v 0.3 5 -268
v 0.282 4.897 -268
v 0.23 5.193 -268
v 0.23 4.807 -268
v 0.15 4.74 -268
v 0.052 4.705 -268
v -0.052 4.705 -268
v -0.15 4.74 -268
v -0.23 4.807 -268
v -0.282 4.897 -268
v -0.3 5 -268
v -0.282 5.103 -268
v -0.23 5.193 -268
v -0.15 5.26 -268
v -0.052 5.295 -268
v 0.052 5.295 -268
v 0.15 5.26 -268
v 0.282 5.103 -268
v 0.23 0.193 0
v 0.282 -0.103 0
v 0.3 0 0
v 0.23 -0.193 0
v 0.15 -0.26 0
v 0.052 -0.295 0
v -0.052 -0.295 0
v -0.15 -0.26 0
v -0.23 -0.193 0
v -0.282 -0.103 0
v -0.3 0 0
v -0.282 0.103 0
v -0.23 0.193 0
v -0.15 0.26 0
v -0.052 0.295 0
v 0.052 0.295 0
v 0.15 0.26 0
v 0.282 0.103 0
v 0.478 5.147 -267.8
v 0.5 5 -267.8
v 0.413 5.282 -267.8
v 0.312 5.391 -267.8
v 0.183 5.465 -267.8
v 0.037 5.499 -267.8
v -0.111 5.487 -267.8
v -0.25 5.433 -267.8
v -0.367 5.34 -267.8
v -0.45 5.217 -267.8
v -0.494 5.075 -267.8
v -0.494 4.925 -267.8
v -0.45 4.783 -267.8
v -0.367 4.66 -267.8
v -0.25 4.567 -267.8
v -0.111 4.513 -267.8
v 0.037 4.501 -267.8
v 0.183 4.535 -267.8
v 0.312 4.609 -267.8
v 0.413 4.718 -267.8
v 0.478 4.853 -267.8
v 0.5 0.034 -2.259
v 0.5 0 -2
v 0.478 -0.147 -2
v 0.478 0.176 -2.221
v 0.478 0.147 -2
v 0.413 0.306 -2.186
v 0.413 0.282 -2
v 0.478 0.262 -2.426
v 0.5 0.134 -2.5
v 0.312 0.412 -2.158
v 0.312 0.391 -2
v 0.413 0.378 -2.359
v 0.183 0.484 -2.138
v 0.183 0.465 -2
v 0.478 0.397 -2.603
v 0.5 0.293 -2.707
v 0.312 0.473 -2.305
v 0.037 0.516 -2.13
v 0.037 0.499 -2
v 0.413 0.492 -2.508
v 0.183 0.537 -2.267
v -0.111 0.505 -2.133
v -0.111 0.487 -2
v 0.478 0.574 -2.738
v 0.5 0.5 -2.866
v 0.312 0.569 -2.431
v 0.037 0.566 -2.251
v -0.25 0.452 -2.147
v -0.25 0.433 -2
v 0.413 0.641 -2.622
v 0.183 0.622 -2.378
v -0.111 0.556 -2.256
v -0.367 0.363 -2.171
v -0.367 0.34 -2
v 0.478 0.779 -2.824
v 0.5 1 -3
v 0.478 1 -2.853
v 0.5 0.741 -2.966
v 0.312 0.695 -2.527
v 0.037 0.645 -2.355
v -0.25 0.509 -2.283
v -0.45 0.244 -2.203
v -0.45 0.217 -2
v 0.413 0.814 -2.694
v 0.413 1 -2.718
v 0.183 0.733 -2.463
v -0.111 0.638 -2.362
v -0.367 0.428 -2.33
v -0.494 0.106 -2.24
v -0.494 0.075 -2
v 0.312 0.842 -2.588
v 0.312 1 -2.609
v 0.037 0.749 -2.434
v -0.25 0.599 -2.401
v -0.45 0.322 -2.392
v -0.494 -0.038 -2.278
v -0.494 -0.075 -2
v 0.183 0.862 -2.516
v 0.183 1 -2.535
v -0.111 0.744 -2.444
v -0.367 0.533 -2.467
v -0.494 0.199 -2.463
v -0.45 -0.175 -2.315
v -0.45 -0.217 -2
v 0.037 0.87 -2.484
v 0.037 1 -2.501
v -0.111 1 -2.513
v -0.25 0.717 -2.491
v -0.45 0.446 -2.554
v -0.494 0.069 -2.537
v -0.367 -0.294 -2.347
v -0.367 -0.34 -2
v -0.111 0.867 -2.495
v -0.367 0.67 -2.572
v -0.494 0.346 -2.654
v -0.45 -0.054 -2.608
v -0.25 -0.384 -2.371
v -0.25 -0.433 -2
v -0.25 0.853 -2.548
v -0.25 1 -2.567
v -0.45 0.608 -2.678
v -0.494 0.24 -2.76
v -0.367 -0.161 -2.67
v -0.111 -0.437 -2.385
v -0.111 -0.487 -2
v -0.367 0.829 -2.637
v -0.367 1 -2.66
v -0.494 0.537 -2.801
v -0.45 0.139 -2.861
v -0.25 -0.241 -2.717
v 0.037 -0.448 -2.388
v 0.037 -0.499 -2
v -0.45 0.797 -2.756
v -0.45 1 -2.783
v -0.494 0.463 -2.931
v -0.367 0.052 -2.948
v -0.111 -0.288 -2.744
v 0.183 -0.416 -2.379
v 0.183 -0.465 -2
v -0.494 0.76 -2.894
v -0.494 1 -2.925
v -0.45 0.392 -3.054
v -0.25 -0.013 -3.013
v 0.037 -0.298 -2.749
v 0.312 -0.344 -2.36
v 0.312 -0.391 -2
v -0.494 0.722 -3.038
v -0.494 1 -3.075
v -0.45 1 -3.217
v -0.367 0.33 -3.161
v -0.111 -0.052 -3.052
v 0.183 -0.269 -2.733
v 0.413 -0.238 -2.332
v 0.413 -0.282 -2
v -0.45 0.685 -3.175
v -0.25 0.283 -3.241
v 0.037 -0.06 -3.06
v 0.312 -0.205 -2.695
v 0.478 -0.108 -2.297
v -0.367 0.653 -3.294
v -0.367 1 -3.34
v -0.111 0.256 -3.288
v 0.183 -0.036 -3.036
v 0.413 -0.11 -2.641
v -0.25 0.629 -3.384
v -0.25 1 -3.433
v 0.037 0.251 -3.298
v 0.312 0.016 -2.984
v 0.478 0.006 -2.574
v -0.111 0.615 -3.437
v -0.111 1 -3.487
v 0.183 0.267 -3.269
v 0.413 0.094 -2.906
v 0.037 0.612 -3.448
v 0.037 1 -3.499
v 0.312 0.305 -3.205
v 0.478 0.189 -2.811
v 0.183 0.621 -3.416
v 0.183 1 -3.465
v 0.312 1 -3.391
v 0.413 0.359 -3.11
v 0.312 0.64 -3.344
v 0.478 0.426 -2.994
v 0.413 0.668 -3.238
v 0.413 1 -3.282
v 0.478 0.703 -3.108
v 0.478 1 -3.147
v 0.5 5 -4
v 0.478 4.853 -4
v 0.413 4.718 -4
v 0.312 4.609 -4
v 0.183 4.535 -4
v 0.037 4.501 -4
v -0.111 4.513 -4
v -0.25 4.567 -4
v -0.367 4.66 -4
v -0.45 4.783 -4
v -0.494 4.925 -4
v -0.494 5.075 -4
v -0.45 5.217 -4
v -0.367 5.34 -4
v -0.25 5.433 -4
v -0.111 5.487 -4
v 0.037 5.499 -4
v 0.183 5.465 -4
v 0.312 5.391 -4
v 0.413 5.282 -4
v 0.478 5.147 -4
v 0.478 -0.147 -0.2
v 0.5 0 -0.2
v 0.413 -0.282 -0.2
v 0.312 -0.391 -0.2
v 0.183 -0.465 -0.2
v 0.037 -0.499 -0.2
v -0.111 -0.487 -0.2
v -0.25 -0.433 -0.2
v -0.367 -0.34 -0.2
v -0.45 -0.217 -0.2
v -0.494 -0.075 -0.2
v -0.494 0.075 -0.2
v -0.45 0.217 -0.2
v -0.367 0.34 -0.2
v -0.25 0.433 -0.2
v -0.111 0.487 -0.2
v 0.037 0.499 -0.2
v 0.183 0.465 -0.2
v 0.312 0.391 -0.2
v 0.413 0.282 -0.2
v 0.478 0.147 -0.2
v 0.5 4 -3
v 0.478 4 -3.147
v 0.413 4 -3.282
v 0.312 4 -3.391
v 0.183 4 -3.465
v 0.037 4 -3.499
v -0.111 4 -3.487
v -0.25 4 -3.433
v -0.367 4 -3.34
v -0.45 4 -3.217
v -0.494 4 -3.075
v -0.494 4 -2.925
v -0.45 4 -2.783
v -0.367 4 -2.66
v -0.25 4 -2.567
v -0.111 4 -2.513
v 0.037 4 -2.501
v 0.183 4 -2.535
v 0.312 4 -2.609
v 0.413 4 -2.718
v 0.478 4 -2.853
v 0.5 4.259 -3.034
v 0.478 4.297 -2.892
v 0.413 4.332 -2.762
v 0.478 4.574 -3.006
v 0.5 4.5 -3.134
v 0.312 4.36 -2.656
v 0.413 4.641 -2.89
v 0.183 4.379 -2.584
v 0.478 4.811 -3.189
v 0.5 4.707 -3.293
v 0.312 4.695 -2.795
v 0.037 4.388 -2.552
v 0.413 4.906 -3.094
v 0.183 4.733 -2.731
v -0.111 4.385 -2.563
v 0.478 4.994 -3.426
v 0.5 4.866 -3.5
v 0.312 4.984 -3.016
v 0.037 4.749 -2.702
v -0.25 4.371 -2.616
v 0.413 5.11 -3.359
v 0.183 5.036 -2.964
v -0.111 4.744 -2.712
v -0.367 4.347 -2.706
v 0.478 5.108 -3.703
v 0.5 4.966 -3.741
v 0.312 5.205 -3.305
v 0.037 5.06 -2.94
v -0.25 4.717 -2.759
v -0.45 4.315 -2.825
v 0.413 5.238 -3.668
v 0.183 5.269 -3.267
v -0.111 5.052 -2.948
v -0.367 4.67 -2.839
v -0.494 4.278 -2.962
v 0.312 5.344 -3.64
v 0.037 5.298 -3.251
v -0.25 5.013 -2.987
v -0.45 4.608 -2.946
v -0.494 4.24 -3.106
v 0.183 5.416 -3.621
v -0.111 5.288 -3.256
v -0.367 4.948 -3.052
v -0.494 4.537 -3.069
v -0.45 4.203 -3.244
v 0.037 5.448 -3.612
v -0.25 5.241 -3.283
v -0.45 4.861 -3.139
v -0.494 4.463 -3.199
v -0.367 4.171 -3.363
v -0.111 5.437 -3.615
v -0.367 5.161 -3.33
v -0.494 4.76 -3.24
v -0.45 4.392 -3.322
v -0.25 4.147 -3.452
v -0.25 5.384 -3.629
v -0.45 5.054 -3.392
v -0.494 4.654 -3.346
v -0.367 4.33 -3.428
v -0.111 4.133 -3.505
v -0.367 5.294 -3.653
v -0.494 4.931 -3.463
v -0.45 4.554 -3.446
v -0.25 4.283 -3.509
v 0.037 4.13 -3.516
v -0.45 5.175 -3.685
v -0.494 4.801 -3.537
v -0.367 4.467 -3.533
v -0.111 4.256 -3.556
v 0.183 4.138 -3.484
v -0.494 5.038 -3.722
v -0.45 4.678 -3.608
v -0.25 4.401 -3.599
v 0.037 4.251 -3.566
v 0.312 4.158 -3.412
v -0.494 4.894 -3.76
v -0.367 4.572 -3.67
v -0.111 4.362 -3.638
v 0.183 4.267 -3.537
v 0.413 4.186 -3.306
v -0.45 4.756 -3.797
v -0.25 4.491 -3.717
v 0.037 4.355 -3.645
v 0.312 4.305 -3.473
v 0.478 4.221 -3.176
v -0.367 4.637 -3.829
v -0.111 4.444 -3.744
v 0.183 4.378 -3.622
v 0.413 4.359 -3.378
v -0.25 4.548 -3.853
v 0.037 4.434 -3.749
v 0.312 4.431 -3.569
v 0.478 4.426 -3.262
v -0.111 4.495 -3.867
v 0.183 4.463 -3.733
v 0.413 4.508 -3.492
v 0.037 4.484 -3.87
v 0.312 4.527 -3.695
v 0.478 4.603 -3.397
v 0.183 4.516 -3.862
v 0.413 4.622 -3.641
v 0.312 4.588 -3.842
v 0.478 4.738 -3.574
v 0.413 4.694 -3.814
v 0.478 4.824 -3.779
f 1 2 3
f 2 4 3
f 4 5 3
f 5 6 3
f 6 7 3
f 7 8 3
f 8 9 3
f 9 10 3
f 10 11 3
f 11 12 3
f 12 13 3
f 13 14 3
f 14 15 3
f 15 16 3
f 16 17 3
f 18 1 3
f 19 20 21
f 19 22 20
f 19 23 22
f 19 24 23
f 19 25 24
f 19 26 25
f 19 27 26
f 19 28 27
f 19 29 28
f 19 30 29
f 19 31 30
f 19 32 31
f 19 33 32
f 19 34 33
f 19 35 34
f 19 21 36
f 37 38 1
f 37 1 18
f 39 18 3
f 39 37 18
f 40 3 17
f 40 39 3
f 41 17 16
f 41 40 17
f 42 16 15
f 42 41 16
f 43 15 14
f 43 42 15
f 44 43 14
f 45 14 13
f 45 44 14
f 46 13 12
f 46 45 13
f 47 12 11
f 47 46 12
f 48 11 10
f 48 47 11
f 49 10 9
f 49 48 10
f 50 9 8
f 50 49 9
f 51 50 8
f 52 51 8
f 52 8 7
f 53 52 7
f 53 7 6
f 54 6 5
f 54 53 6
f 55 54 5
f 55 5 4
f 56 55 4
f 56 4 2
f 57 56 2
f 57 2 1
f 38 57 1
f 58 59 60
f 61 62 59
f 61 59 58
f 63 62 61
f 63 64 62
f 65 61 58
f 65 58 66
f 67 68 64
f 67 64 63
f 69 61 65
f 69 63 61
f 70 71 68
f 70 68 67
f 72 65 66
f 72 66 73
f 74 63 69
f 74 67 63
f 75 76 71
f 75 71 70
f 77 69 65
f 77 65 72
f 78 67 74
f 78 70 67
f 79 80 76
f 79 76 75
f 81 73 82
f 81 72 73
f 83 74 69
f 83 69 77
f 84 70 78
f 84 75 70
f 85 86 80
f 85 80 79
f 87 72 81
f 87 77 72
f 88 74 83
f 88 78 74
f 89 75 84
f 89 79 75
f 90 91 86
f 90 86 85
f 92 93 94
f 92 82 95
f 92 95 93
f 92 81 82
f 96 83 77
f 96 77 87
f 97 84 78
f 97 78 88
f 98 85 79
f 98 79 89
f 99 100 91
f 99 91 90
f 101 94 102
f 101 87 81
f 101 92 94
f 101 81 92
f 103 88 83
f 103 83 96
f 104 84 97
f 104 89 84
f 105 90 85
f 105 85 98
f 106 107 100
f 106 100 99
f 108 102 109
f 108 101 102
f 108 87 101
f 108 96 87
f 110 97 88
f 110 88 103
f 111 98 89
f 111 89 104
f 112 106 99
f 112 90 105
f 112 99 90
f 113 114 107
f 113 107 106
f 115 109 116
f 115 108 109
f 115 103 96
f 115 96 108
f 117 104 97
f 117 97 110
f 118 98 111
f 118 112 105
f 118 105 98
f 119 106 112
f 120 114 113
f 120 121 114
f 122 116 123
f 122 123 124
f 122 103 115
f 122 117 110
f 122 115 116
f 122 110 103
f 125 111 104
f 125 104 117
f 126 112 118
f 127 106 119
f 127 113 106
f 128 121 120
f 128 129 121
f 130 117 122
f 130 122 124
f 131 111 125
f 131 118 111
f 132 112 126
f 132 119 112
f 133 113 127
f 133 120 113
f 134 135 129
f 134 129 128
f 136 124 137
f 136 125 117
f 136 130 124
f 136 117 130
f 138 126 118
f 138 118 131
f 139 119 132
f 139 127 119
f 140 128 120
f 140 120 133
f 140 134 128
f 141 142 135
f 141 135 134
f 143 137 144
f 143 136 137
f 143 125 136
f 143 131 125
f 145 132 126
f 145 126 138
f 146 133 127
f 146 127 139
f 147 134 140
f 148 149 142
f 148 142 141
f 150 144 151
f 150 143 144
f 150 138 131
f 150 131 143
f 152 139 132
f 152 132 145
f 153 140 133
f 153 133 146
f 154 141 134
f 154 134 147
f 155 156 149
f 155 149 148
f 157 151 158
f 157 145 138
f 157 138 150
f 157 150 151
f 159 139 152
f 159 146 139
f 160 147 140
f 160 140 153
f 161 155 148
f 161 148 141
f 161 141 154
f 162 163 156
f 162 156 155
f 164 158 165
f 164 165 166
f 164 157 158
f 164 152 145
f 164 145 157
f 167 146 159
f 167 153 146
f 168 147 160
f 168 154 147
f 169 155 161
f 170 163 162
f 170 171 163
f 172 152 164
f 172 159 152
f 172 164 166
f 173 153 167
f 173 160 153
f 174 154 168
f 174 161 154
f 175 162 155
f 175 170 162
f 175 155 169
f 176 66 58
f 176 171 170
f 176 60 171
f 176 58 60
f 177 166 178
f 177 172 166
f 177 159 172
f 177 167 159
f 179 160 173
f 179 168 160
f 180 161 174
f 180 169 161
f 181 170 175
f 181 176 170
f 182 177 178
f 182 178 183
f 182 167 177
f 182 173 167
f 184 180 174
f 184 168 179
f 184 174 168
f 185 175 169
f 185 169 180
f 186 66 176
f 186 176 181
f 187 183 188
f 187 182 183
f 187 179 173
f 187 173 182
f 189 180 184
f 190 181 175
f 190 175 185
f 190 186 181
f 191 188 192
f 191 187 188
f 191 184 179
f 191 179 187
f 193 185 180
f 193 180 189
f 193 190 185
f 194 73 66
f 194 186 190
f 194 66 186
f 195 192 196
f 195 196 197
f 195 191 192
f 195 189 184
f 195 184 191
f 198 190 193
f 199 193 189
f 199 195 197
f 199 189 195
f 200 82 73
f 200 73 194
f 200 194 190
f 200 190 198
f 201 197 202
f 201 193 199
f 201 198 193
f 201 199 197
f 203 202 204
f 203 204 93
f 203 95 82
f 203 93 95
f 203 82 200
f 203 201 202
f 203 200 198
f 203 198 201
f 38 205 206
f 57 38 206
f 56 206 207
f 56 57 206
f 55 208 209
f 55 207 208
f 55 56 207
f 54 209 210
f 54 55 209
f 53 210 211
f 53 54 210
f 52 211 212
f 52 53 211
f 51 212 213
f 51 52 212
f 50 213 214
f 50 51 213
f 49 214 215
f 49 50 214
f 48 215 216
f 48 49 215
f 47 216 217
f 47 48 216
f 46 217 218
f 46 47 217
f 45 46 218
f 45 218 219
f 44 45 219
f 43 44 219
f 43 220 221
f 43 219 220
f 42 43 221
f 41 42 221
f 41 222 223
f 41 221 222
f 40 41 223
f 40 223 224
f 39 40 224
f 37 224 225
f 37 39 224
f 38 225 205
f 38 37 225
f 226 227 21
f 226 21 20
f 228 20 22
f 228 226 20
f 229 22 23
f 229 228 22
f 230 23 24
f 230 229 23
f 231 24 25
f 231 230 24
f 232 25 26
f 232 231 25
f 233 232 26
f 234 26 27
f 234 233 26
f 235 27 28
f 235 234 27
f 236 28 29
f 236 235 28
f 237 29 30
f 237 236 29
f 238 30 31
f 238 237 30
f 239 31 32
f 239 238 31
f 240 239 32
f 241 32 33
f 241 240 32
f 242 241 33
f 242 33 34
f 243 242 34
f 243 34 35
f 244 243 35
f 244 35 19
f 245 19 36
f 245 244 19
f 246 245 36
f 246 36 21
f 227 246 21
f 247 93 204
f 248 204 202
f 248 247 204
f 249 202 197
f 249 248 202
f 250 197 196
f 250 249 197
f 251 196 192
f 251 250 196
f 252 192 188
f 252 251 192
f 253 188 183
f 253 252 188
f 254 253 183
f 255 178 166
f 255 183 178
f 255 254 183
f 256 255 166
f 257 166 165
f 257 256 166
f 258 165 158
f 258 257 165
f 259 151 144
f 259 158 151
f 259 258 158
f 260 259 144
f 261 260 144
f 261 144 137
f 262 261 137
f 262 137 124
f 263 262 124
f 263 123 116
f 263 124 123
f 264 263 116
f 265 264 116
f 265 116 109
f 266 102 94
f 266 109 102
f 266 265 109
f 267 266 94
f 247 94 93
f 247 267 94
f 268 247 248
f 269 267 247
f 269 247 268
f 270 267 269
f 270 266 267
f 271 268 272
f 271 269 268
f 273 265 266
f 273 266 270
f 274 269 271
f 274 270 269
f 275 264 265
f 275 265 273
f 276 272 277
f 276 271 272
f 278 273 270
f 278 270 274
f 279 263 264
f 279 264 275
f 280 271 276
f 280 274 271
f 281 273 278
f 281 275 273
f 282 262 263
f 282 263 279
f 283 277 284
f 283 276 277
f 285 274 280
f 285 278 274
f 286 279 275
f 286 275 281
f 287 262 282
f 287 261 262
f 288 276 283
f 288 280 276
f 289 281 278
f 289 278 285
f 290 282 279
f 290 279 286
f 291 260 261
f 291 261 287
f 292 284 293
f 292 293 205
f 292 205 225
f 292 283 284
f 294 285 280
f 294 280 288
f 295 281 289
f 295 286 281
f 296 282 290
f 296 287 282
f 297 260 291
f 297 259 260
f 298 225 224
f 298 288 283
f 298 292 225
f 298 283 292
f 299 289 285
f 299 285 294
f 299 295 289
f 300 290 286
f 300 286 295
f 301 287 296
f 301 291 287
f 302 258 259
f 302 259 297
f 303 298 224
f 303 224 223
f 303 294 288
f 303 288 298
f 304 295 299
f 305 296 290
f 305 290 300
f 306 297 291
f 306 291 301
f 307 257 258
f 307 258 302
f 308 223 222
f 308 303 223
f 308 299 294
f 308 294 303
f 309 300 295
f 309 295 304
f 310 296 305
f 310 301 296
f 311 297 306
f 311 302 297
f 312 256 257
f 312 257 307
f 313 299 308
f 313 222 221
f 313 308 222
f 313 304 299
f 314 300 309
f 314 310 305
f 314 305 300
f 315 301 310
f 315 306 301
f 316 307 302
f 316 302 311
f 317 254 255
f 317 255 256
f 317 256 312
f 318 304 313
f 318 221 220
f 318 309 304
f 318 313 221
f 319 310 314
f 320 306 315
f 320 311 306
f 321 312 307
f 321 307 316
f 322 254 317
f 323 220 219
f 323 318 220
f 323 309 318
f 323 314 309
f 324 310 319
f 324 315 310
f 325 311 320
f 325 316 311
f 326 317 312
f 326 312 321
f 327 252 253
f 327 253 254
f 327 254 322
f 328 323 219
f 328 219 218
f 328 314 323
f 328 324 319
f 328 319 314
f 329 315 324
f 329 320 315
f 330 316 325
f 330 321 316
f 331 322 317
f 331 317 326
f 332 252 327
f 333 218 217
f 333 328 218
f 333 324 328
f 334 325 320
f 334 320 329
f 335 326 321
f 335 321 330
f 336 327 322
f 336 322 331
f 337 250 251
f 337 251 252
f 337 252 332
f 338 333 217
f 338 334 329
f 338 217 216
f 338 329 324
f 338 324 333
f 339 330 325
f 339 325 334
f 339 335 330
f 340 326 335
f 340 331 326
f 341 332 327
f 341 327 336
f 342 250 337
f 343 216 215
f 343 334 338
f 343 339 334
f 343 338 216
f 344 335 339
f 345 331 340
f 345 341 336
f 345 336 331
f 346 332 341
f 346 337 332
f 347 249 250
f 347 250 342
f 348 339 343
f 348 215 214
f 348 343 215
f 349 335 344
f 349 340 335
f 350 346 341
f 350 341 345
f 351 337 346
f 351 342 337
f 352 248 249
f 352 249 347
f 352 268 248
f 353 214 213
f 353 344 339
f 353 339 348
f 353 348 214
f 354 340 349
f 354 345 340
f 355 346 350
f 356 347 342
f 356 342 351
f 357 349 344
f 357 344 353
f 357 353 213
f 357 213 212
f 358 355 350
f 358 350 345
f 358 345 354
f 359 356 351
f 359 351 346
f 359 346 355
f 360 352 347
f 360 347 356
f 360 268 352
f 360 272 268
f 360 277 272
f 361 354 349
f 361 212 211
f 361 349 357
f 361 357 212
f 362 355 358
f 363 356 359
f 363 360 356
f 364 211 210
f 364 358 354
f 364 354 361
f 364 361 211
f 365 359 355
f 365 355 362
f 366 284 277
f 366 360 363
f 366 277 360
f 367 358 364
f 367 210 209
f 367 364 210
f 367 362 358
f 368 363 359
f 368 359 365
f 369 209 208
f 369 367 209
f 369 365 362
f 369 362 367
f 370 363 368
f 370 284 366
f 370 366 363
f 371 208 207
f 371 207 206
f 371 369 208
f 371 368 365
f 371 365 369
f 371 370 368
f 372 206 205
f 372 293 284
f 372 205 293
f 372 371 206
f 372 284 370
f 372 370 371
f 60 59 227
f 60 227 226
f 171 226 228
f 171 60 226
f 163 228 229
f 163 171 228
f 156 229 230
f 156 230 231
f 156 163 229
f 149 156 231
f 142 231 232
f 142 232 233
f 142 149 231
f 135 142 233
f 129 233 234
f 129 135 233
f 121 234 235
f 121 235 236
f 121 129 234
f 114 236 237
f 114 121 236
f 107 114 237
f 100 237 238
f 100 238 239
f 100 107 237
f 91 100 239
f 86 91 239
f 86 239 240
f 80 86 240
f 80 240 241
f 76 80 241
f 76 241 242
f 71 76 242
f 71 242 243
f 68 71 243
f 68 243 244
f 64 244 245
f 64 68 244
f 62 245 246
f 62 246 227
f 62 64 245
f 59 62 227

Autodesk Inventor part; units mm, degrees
ref_plane "YZ Plane" through (0, 0, 0) normal (1, 0, 0) x (0, 1, 0)
ref_plane "XZ Plane" through (0, 0, 0) normal (0, 1, 0) x (-1, 0, 0)
ref_plane "XY Plane" through (0, 0, 0) normal (0, 0, 1) x (1, 0, 0)
sketch "Sketch1" plane through (0, 0, 0) normal (0, 0, 1) x (1, 0, 0)
  circle A0 centre (0, 0) radius 0.5
  dimension "d0" = 1
sketch "Sketch2" plane through (0, 0, 0) normal (1, 0, 0) x (0, 1, 0)
  line L0 (0, 0) -> (0, -2)
  line L1 (1, -3) -> (4, -3)
  line L2 (5, -4) -> (5, -268)
  arc A0 (5, -4) -> (4, -3) centre (4, -4) ccw
  arc A1 (0, -2) -> (1, -3) centre (1, -2) ccw
  point P0 (0, -3)
  point P1 (5, -3)
  dimension "d1" = 3
  dimension "d2" = 5
  dimension "d3" = 265
  dimension "d4" = 1
sweep "Sweep1" add profiles "Sketch1" path "Sketch2"
chamfer "Chamfer1" distance 0.2 angle 45 6 edges at (-0.5, 0, 0) (-0.5, 0, -2) (-0.5, 1, -3) (-0.5, 4, -3) (-0.5, 5, -4) (-0.5, 5, -268)
equation "\"d3\" = Length"
equation "\"Length\" = 265"
properties part number "TAIL" material "Steel, High Strength, Low Alloy"
